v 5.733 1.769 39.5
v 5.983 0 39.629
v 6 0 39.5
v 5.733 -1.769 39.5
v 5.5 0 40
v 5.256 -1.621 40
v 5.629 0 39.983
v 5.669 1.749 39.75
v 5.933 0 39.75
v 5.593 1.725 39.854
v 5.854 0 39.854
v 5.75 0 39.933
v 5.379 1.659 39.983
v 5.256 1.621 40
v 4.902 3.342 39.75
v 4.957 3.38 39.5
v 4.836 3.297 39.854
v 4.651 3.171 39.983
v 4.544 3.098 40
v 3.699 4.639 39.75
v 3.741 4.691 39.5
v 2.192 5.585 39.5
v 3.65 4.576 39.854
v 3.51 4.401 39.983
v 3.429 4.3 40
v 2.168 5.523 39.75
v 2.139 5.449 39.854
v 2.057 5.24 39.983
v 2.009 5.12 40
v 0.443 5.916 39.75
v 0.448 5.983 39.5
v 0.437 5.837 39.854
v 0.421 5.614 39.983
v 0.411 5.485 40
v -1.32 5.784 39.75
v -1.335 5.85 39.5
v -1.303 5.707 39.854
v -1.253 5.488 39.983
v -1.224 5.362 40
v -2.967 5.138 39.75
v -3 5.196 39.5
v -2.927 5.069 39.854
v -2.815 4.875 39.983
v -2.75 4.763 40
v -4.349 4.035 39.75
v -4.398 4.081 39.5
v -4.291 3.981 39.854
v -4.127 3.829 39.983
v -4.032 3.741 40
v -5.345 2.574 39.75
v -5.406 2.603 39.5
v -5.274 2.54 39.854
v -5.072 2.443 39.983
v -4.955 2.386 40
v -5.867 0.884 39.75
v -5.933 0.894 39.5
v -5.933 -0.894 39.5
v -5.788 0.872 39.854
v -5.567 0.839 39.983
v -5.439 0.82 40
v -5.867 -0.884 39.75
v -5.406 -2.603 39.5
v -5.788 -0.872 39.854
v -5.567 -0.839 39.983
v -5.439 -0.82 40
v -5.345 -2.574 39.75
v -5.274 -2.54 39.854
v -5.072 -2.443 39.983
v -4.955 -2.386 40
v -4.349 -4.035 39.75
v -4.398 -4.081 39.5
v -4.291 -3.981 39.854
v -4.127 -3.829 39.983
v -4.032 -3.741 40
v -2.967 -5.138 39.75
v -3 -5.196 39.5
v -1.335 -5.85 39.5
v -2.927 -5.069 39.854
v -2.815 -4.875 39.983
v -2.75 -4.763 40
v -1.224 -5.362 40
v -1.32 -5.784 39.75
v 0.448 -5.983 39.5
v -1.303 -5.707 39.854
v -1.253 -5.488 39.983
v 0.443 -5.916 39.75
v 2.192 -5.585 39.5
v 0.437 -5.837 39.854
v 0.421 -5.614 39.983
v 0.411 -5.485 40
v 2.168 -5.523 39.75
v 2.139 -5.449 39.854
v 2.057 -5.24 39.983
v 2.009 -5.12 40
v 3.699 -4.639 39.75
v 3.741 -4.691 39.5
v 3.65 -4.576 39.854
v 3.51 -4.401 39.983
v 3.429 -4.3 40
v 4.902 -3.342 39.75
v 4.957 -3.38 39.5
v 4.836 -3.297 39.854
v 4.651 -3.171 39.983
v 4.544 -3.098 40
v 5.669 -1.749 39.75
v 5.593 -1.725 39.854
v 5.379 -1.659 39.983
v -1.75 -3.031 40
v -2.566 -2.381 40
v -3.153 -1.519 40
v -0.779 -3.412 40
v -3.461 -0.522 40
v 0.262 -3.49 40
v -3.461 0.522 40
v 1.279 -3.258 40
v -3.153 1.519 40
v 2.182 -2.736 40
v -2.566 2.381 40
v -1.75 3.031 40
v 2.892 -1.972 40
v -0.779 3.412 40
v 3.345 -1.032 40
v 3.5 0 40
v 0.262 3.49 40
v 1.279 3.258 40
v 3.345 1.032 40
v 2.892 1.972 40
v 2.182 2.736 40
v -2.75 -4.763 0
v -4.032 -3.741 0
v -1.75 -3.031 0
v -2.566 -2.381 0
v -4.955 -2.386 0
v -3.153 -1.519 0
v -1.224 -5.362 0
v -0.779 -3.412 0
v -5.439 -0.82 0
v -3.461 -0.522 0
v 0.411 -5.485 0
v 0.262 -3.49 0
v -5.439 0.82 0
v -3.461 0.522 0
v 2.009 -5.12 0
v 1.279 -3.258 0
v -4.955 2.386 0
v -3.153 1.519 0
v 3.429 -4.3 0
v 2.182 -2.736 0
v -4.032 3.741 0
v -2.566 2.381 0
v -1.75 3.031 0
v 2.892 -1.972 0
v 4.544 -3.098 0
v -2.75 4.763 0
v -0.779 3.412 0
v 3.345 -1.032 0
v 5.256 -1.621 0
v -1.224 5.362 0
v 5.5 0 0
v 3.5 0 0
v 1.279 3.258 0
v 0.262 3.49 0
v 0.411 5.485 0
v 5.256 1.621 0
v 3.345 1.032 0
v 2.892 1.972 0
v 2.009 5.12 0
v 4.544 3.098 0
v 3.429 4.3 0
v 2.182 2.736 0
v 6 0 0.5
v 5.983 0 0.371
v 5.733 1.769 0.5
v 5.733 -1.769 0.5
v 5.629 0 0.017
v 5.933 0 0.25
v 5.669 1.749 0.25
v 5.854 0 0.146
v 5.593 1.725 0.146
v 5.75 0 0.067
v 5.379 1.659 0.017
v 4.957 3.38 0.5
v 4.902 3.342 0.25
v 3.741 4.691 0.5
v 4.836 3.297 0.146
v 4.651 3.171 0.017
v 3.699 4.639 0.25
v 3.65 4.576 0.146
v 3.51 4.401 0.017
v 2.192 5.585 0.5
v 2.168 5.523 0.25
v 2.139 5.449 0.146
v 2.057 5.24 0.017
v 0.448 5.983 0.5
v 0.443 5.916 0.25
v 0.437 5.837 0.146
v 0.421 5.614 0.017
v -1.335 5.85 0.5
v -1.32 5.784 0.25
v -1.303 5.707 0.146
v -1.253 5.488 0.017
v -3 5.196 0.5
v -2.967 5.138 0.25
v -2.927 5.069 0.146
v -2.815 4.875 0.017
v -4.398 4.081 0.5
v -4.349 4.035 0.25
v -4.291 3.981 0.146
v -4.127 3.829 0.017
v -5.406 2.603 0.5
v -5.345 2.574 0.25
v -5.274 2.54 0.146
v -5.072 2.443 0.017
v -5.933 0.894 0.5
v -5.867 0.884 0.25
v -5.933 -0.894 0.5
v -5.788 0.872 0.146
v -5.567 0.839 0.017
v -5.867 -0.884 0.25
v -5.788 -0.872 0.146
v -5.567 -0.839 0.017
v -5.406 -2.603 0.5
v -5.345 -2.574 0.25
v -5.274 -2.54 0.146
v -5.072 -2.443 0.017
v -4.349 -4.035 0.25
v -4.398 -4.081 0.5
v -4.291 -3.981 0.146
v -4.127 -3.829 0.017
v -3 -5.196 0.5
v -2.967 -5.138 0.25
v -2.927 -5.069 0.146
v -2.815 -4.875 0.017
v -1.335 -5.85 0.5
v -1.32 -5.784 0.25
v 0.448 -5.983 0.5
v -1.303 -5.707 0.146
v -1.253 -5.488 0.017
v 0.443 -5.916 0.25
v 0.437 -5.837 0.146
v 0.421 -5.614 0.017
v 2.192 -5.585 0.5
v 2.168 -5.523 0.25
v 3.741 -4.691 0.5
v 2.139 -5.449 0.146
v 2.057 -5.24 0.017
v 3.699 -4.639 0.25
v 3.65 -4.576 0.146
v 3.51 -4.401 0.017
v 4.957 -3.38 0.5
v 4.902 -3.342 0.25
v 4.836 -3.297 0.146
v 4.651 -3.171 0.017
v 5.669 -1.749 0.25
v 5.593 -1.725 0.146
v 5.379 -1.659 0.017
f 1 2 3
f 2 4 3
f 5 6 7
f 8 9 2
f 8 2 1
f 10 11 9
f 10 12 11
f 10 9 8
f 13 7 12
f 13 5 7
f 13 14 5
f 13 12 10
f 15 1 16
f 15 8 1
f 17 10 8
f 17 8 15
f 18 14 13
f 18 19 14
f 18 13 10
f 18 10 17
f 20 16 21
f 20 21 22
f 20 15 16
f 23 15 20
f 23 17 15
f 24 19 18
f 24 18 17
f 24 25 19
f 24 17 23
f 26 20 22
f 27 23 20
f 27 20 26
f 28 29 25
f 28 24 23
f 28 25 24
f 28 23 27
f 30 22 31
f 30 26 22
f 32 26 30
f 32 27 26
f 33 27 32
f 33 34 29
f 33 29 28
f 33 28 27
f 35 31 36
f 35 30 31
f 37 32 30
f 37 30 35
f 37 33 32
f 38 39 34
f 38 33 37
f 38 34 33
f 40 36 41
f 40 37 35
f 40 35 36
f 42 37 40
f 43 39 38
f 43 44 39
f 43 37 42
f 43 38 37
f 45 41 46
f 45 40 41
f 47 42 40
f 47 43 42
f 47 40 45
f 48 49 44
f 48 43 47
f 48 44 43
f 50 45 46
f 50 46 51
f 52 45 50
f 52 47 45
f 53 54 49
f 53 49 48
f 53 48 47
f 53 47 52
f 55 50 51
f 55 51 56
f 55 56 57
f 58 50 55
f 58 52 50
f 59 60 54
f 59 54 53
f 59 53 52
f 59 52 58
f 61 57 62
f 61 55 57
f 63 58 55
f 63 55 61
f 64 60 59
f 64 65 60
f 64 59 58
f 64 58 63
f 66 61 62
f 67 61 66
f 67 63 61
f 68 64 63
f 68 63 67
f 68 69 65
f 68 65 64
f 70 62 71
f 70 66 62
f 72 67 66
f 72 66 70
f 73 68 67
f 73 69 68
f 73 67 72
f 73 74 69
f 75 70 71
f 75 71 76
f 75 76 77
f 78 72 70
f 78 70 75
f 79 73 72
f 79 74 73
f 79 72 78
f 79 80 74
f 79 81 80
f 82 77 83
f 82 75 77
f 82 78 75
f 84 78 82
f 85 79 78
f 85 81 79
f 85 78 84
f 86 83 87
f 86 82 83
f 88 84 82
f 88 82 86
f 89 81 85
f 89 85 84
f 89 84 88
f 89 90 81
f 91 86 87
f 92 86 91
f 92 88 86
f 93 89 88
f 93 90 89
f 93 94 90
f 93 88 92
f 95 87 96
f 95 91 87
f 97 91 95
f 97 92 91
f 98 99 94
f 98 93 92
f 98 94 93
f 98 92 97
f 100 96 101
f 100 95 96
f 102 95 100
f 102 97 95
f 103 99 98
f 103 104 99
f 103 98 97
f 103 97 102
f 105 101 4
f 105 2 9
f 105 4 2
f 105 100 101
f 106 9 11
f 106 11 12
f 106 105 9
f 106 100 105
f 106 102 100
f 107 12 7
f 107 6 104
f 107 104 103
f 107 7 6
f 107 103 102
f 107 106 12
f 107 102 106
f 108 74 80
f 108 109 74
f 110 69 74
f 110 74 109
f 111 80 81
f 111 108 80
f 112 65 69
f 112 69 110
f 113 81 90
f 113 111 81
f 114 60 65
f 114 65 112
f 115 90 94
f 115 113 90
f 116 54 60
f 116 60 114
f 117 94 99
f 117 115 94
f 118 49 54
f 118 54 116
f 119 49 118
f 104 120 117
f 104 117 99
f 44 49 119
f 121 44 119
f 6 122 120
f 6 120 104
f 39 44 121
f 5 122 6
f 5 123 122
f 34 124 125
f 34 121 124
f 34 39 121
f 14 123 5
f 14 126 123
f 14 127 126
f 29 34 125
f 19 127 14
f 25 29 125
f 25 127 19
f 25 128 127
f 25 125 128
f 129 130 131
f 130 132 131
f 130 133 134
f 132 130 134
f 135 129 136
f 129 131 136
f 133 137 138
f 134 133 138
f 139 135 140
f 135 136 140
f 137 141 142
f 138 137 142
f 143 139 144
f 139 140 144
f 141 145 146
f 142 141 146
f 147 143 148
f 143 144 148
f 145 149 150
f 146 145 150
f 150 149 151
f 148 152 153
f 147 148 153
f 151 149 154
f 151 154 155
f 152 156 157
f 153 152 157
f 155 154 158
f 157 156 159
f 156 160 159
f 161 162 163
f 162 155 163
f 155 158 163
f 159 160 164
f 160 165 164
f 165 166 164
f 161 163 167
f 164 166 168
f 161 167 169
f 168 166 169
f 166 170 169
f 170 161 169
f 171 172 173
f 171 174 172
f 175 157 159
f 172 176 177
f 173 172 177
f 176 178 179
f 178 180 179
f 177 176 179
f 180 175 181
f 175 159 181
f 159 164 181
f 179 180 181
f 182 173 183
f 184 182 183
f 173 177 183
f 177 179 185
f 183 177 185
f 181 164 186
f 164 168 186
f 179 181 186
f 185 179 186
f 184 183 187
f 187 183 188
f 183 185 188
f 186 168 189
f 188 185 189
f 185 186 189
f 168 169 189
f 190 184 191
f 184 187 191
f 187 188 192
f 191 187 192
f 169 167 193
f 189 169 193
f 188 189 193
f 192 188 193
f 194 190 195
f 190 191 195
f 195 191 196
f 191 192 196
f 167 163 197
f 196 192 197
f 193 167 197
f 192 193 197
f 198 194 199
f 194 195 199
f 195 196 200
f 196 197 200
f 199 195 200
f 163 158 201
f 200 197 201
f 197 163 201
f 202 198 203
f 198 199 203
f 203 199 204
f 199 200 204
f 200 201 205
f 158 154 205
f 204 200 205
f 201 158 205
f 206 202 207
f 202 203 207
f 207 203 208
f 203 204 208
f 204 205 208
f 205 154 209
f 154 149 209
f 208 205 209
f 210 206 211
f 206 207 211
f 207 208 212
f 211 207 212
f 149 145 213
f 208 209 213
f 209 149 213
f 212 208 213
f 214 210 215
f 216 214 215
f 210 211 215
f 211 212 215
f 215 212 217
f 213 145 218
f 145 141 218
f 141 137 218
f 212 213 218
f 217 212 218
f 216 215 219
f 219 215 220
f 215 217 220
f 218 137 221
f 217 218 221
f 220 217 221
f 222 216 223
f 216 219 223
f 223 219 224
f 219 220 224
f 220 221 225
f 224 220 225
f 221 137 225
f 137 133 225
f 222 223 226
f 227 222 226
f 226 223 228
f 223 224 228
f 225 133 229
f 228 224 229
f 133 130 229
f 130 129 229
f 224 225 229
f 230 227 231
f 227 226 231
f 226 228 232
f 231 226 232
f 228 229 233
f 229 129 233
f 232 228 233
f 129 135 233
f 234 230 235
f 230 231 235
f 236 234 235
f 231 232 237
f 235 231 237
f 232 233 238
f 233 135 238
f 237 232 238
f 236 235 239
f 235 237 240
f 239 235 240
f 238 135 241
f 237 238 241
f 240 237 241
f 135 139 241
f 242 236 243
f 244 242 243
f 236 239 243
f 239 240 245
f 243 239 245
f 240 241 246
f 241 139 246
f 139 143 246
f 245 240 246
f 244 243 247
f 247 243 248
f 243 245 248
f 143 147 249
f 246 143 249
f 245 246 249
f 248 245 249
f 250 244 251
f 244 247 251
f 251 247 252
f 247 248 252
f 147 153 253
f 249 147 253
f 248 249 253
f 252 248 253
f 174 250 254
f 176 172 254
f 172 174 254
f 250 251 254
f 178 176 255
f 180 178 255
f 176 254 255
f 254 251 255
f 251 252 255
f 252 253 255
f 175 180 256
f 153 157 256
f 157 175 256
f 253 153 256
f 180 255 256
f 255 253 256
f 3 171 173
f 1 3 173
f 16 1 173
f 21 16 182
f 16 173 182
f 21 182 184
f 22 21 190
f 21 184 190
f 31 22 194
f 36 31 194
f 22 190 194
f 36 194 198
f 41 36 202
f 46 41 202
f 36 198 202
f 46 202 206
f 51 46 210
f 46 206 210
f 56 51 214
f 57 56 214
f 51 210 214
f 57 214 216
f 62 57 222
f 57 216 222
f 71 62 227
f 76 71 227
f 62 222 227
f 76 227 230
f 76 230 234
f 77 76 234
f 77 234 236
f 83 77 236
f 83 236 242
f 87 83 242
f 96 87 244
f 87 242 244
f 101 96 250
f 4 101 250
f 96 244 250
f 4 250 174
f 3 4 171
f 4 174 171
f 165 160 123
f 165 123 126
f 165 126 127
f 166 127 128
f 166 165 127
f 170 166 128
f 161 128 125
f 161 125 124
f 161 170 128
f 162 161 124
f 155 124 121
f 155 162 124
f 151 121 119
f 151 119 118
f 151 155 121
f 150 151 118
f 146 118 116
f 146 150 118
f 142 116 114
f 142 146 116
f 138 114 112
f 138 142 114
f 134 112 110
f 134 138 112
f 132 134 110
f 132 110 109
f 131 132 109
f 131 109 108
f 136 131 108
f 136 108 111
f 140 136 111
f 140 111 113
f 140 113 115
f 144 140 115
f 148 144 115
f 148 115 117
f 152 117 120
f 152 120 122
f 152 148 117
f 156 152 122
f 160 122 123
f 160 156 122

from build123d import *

# Parameters (mm, degrees)
SKETCH1_R           = 6
SKETCH1_R_2         = 3.5
BOSS_EXTRUDE1_DEPTH = 40
FILLET1_R           = 0.5
FILLET2_R           = 0.5


with BuildPart() as part:
    # Sketch1 → Boss-Extrude1 (new body)
    with BuildSketch(Plane.XY):
        Circle(SKETCH1_R)
        Circle(SKETCH1_R_2, mode=Mode.SUBTRACT)
    extrude(amount=BOSS_EXTRUDE1_DEPTH)

    # Fillet1
    fillet1_edges = [part.edges().sort_by_distance(p)[0] for p in [
        (-6, 0, 40),
    ]]
    fillet(fillet1_edges, radius=FILLET1_R)

    # Fillet2
    fillet2_edges = [part.edges().sort_by_distance(p)[0] for p in [
        (-6, 0, 0),
    ]]
    fillet(fillet2_edges, radius=FILLET2_R)


solid = part.part
